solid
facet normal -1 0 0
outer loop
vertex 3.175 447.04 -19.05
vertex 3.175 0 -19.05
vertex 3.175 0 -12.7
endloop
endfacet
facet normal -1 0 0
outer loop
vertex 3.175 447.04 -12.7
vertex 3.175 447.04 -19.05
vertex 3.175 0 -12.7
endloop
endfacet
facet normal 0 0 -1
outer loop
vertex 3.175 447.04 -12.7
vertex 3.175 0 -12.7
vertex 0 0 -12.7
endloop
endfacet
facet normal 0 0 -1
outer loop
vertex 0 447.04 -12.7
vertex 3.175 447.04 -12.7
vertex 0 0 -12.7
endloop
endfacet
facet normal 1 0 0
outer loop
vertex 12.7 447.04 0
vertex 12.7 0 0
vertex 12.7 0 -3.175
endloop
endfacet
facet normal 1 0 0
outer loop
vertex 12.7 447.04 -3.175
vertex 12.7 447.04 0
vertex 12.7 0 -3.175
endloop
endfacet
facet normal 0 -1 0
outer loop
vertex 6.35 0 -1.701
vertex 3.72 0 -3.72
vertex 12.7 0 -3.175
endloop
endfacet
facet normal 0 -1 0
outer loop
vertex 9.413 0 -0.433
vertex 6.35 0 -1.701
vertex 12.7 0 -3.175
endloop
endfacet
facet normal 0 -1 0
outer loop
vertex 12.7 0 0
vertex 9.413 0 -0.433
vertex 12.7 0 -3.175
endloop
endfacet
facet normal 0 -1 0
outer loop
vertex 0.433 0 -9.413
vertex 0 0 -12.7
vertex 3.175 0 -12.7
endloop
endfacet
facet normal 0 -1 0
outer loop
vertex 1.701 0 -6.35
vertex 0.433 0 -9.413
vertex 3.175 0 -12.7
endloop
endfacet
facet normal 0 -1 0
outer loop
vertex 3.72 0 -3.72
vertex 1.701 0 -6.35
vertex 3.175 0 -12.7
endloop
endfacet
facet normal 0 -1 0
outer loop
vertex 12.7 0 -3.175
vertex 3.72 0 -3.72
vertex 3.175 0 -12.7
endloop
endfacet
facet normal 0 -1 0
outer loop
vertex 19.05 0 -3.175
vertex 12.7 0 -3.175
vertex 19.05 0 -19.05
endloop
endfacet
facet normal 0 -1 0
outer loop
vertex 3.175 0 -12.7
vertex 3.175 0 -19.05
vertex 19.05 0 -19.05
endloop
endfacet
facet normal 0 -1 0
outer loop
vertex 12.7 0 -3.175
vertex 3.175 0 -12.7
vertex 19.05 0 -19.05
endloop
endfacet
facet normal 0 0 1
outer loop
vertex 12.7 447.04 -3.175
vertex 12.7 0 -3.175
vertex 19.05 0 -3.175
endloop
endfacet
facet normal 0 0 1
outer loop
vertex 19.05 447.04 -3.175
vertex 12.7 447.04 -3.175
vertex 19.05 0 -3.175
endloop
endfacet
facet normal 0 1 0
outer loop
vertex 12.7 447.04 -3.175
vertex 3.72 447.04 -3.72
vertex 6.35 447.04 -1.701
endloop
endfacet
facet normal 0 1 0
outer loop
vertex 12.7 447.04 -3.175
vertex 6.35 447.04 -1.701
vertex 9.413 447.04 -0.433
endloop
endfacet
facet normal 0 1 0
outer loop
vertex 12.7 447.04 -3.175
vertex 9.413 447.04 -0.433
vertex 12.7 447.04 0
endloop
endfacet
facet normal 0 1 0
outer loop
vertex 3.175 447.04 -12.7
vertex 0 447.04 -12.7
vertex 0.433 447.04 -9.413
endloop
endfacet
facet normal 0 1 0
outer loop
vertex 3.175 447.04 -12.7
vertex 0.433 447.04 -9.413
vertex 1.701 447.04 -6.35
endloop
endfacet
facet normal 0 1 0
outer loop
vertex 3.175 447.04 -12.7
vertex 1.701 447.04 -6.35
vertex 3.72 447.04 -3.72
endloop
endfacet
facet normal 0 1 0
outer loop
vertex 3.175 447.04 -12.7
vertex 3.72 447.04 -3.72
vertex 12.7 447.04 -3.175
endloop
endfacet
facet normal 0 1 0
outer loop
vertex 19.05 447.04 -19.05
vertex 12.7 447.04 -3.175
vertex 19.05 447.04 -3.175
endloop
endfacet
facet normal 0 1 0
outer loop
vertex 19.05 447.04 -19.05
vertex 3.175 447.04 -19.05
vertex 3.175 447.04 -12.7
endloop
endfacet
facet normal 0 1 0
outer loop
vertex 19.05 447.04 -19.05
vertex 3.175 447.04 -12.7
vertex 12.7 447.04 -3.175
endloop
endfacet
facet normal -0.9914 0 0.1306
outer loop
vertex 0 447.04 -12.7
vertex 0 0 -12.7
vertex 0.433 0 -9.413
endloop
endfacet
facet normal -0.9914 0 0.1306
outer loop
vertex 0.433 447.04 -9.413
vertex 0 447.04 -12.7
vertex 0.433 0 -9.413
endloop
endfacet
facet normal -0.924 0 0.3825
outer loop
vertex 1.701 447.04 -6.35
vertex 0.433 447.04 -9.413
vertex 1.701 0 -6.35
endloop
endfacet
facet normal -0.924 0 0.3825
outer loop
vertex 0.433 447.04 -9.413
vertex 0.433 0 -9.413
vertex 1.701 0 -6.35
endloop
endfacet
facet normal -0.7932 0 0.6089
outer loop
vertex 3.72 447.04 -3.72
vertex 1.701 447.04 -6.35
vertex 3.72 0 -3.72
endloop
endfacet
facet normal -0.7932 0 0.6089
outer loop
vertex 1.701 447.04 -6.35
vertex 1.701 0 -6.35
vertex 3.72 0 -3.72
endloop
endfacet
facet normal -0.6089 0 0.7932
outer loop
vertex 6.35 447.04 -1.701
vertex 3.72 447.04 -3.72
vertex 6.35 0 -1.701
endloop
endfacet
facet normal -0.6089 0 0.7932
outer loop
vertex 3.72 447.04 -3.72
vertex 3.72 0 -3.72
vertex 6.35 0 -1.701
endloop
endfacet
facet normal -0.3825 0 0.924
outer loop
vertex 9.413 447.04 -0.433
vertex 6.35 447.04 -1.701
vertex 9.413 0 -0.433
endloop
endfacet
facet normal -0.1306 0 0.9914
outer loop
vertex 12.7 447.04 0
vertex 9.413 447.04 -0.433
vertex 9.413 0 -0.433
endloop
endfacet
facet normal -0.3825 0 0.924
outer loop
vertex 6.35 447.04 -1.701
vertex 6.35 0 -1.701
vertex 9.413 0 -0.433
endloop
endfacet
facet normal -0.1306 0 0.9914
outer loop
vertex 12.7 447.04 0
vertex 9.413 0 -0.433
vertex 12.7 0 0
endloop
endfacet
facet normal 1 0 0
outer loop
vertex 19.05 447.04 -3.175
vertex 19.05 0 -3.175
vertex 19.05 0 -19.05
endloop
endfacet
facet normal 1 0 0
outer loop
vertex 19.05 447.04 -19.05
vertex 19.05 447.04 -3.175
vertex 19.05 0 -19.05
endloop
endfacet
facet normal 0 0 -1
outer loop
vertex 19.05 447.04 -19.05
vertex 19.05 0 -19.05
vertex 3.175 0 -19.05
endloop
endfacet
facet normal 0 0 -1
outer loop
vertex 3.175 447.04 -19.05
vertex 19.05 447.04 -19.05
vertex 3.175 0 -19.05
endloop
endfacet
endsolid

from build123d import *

# Parameters (mm, degrees)
BOSS_EXTRUDE1_DEPTH = 447.04


with BuildPart() as part:
    # Sketch1 → Boss-Extrude1 (new body)
    with BuildSketch(Plane(origin=(0, 0, 0), x_dir=(1, 0, 0), z_dir=(0, 1, 0))):
        with BuildLine():
            ThreePointArc((0, 12.7), (3.719743879, 3.719743879), (12.7, 0))
            Line((12.7, 0), (12.7, 3.175))
            Line((12.7, 3.175), (19.05, 3.175))
            Line((19.05, 3.175), (19.05, 19.05))
            Line((19.05, 19.05), (3.175, 19.05))
            Line((3.175, 19.05), (3.175, 12.7))
            Line((3.175, 12.7), (0, 12.7))
        make_face()
    extrude(amount=BOSS_EXTRUDE1_DEPTH)


solid = part.part
